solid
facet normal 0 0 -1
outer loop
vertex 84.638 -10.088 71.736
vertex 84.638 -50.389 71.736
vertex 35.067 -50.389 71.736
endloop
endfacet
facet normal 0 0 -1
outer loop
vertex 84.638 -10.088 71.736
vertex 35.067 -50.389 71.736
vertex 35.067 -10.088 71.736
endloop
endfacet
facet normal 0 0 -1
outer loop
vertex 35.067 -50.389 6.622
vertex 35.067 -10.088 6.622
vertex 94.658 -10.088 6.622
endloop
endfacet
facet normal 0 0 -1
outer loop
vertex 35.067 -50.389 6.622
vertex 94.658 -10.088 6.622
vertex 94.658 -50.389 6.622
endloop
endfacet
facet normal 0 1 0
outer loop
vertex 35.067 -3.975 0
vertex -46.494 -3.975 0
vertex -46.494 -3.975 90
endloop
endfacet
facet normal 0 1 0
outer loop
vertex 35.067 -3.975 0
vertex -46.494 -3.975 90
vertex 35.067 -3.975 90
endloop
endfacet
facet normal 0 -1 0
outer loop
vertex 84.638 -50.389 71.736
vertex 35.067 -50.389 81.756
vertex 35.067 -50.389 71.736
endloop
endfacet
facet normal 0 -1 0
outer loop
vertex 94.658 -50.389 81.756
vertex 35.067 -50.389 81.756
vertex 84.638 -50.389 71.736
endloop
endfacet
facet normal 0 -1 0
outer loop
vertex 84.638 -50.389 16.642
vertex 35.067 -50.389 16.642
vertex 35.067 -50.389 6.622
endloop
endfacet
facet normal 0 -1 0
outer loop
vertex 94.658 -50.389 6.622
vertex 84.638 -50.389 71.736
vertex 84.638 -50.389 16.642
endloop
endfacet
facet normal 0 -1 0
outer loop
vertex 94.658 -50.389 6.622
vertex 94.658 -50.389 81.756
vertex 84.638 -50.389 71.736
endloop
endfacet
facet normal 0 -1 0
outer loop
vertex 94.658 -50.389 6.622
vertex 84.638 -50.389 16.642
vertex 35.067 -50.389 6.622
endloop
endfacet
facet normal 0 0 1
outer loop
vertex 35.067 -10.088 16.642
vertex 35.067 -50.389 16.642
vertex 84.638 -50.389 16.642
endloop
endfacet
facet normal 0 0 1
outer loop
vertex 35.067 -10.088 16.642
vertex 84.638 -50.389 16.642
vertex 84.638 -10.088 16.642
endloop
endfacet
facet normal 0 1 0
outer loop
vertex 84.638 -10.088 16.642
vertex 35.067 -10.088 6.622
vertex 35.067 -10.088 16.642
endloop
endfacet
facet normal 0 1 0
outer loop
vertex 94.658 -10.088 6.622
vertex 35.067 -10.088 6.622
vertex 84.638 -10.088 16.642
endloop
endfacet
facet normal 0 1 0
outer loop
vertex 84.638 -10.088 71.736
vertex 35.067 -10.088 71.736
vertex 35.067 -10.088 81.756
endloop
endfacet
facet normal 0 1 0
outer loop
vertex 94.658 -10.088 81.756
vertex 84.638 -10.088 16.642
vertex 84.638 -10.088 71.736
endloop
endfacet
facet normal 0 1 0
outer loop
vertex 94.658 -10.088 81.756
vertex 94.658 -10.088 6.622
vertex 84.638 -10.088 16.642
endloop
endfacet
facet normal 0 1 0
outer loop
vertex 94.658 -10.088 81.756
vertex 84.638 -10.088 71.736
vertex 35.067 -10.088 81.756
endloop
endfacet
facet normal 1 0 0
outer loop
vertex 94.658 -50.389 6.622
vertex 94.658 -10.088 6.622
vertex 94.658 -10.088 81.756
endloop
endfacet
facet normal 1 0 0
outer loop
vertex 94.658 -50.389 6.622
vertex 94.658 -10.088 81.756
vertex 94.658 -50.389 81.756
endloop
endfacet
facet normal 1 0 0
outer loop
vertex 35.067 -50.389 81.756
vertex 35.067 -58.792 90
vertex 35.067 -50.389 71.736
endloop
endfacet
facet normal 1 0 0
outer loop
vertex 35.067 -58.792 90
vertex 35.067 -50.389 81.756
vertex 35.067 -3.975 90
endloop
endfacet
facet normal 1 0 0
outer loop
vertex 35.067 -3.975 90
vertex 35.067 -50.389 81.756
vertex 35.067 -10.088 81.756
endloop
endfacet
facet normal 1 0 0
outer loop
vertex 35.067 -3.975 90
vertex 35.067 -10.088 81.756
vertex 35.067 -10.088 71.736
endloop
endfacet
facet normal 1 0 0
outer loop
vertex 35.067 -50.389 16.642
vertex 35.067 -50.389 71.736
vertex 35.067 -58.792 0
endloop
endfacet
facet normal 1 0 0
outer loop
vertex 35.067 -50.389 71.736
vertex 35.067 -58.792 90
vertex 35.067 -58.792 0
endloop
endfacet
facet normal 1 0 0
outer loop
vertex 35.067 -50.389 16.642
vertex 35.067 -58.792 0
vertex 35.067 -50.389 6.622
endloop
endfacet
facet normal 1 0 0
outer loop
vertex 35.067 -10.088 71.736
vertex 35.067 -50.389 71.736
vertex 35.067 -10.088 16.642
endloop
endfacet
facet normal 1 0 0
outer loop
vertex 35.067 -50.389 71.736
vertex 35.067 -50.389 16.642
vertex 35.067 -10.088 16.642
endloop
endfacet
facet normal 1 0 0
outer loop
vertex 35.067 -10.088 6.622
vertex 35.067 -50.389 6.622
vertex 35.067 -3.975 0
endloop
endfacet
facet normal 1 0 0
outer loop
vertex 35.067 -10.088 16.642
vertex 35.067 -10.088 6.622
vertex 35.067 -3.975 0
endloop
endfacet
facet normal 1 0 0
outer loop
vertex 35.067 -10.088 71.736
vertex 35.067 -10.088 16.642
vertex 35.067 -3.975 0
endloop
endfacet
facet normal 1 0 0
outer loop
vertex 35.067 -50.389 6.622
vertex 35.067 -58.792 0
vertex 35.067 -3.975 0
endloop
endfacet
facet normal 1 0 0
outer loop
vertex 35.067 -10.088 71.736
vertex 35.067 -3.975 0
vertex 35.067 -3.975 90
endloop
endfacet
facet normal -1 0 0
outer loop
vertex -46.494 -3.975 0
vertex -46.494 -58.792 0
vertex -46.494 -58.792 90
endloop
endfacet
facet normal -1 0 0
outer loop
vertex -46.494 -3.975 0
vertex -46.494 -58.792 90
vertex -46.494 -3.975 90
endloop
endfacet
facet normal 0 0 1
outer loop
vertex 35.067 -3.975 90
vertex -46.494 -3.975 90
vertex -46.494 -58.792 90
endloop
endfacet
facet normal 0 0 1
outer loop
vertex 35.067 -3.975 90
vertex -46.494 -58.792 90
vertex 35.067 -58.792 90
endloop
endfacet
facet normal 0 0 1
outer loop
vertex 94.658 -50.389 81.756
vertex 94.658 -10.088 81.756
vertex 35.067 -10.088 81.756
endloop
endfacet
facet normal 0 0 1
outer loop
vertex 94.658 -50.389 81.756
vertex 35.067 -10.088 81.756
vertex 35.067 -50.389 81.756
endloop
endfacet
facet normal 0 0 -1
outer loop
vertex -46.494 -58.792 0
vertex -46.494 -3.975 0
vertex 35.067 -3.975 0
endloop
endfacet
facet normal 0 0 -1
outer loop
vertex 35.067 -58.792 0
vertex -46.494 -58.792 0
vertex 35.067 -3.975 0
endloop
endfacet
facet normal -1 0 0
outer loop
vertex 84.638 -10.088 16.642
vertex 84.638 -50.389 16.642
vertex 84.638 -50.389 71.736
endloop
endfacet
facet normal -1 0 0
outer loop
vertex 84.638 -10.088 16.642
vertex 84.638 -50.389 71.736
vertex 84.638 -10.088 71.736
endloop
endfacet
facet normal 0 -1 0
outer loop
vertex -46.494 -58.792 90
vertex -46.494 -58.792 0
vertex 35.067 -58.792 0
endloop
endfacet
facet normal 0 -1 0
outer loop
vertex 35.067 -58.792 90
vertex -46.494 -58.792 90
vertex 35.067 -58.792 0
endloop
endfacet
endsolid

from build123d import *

# Parameters (mm, degrees)
SKETCH1_W           = 81.56143141
SKETCH1_H           = 54.816869018
BOSS_EXTRUDE1_DEPTH = 90
SKETCH2_W           = 10.019793311
SKETCH2_H           = 40.301038966


with BuildPart() as part:
    # Sketch1 → Boss-Extrude1 (new body)
    with BuildSketch(Plane(origin=(-20.318735881, -25.313413314, 0), x_dir=(1, 0, 0), z_dir=(0, 0, 1))):
        with Locations((14.605186555, -6.069687919)):
            Rectangle(SKETCH1_W, SKETCH1_H)
    extrude(amount=BOSS_EXTRUDE1_DEPTH)

    # Sweep3: sweep along a path in Sketch3
    with BuildLine(Plane(origin=(0, -10.087901928, 0), x_dir=(1, 0, 0), z_dir=(0, 1, 0))) as sweep3_path:
        Line((35.067166378, -76.74628409), (89.647981196, -76.74628409))
        Line((89.647981196, -76.74628409), (89.647981196, -11.63207723))
        Line((89.647981196, -11.63207723), (35.067166378, -11.63207723))
    # Sketch2 → Sweep3 (sweep)
    with BuildSketch(Plane(origin=(35.067166378, 0, 0), x_dir=(0, 0, -1), z_dir=(1, 0, 0))):
        with Locations((-76.74628409, -30.238421411)):
            Rectangle(SKETCH2_W, SKETCH2_H)
    sweep(path=sweep3_path.line, transition=Transition.RIGHT)


solid = part.part
